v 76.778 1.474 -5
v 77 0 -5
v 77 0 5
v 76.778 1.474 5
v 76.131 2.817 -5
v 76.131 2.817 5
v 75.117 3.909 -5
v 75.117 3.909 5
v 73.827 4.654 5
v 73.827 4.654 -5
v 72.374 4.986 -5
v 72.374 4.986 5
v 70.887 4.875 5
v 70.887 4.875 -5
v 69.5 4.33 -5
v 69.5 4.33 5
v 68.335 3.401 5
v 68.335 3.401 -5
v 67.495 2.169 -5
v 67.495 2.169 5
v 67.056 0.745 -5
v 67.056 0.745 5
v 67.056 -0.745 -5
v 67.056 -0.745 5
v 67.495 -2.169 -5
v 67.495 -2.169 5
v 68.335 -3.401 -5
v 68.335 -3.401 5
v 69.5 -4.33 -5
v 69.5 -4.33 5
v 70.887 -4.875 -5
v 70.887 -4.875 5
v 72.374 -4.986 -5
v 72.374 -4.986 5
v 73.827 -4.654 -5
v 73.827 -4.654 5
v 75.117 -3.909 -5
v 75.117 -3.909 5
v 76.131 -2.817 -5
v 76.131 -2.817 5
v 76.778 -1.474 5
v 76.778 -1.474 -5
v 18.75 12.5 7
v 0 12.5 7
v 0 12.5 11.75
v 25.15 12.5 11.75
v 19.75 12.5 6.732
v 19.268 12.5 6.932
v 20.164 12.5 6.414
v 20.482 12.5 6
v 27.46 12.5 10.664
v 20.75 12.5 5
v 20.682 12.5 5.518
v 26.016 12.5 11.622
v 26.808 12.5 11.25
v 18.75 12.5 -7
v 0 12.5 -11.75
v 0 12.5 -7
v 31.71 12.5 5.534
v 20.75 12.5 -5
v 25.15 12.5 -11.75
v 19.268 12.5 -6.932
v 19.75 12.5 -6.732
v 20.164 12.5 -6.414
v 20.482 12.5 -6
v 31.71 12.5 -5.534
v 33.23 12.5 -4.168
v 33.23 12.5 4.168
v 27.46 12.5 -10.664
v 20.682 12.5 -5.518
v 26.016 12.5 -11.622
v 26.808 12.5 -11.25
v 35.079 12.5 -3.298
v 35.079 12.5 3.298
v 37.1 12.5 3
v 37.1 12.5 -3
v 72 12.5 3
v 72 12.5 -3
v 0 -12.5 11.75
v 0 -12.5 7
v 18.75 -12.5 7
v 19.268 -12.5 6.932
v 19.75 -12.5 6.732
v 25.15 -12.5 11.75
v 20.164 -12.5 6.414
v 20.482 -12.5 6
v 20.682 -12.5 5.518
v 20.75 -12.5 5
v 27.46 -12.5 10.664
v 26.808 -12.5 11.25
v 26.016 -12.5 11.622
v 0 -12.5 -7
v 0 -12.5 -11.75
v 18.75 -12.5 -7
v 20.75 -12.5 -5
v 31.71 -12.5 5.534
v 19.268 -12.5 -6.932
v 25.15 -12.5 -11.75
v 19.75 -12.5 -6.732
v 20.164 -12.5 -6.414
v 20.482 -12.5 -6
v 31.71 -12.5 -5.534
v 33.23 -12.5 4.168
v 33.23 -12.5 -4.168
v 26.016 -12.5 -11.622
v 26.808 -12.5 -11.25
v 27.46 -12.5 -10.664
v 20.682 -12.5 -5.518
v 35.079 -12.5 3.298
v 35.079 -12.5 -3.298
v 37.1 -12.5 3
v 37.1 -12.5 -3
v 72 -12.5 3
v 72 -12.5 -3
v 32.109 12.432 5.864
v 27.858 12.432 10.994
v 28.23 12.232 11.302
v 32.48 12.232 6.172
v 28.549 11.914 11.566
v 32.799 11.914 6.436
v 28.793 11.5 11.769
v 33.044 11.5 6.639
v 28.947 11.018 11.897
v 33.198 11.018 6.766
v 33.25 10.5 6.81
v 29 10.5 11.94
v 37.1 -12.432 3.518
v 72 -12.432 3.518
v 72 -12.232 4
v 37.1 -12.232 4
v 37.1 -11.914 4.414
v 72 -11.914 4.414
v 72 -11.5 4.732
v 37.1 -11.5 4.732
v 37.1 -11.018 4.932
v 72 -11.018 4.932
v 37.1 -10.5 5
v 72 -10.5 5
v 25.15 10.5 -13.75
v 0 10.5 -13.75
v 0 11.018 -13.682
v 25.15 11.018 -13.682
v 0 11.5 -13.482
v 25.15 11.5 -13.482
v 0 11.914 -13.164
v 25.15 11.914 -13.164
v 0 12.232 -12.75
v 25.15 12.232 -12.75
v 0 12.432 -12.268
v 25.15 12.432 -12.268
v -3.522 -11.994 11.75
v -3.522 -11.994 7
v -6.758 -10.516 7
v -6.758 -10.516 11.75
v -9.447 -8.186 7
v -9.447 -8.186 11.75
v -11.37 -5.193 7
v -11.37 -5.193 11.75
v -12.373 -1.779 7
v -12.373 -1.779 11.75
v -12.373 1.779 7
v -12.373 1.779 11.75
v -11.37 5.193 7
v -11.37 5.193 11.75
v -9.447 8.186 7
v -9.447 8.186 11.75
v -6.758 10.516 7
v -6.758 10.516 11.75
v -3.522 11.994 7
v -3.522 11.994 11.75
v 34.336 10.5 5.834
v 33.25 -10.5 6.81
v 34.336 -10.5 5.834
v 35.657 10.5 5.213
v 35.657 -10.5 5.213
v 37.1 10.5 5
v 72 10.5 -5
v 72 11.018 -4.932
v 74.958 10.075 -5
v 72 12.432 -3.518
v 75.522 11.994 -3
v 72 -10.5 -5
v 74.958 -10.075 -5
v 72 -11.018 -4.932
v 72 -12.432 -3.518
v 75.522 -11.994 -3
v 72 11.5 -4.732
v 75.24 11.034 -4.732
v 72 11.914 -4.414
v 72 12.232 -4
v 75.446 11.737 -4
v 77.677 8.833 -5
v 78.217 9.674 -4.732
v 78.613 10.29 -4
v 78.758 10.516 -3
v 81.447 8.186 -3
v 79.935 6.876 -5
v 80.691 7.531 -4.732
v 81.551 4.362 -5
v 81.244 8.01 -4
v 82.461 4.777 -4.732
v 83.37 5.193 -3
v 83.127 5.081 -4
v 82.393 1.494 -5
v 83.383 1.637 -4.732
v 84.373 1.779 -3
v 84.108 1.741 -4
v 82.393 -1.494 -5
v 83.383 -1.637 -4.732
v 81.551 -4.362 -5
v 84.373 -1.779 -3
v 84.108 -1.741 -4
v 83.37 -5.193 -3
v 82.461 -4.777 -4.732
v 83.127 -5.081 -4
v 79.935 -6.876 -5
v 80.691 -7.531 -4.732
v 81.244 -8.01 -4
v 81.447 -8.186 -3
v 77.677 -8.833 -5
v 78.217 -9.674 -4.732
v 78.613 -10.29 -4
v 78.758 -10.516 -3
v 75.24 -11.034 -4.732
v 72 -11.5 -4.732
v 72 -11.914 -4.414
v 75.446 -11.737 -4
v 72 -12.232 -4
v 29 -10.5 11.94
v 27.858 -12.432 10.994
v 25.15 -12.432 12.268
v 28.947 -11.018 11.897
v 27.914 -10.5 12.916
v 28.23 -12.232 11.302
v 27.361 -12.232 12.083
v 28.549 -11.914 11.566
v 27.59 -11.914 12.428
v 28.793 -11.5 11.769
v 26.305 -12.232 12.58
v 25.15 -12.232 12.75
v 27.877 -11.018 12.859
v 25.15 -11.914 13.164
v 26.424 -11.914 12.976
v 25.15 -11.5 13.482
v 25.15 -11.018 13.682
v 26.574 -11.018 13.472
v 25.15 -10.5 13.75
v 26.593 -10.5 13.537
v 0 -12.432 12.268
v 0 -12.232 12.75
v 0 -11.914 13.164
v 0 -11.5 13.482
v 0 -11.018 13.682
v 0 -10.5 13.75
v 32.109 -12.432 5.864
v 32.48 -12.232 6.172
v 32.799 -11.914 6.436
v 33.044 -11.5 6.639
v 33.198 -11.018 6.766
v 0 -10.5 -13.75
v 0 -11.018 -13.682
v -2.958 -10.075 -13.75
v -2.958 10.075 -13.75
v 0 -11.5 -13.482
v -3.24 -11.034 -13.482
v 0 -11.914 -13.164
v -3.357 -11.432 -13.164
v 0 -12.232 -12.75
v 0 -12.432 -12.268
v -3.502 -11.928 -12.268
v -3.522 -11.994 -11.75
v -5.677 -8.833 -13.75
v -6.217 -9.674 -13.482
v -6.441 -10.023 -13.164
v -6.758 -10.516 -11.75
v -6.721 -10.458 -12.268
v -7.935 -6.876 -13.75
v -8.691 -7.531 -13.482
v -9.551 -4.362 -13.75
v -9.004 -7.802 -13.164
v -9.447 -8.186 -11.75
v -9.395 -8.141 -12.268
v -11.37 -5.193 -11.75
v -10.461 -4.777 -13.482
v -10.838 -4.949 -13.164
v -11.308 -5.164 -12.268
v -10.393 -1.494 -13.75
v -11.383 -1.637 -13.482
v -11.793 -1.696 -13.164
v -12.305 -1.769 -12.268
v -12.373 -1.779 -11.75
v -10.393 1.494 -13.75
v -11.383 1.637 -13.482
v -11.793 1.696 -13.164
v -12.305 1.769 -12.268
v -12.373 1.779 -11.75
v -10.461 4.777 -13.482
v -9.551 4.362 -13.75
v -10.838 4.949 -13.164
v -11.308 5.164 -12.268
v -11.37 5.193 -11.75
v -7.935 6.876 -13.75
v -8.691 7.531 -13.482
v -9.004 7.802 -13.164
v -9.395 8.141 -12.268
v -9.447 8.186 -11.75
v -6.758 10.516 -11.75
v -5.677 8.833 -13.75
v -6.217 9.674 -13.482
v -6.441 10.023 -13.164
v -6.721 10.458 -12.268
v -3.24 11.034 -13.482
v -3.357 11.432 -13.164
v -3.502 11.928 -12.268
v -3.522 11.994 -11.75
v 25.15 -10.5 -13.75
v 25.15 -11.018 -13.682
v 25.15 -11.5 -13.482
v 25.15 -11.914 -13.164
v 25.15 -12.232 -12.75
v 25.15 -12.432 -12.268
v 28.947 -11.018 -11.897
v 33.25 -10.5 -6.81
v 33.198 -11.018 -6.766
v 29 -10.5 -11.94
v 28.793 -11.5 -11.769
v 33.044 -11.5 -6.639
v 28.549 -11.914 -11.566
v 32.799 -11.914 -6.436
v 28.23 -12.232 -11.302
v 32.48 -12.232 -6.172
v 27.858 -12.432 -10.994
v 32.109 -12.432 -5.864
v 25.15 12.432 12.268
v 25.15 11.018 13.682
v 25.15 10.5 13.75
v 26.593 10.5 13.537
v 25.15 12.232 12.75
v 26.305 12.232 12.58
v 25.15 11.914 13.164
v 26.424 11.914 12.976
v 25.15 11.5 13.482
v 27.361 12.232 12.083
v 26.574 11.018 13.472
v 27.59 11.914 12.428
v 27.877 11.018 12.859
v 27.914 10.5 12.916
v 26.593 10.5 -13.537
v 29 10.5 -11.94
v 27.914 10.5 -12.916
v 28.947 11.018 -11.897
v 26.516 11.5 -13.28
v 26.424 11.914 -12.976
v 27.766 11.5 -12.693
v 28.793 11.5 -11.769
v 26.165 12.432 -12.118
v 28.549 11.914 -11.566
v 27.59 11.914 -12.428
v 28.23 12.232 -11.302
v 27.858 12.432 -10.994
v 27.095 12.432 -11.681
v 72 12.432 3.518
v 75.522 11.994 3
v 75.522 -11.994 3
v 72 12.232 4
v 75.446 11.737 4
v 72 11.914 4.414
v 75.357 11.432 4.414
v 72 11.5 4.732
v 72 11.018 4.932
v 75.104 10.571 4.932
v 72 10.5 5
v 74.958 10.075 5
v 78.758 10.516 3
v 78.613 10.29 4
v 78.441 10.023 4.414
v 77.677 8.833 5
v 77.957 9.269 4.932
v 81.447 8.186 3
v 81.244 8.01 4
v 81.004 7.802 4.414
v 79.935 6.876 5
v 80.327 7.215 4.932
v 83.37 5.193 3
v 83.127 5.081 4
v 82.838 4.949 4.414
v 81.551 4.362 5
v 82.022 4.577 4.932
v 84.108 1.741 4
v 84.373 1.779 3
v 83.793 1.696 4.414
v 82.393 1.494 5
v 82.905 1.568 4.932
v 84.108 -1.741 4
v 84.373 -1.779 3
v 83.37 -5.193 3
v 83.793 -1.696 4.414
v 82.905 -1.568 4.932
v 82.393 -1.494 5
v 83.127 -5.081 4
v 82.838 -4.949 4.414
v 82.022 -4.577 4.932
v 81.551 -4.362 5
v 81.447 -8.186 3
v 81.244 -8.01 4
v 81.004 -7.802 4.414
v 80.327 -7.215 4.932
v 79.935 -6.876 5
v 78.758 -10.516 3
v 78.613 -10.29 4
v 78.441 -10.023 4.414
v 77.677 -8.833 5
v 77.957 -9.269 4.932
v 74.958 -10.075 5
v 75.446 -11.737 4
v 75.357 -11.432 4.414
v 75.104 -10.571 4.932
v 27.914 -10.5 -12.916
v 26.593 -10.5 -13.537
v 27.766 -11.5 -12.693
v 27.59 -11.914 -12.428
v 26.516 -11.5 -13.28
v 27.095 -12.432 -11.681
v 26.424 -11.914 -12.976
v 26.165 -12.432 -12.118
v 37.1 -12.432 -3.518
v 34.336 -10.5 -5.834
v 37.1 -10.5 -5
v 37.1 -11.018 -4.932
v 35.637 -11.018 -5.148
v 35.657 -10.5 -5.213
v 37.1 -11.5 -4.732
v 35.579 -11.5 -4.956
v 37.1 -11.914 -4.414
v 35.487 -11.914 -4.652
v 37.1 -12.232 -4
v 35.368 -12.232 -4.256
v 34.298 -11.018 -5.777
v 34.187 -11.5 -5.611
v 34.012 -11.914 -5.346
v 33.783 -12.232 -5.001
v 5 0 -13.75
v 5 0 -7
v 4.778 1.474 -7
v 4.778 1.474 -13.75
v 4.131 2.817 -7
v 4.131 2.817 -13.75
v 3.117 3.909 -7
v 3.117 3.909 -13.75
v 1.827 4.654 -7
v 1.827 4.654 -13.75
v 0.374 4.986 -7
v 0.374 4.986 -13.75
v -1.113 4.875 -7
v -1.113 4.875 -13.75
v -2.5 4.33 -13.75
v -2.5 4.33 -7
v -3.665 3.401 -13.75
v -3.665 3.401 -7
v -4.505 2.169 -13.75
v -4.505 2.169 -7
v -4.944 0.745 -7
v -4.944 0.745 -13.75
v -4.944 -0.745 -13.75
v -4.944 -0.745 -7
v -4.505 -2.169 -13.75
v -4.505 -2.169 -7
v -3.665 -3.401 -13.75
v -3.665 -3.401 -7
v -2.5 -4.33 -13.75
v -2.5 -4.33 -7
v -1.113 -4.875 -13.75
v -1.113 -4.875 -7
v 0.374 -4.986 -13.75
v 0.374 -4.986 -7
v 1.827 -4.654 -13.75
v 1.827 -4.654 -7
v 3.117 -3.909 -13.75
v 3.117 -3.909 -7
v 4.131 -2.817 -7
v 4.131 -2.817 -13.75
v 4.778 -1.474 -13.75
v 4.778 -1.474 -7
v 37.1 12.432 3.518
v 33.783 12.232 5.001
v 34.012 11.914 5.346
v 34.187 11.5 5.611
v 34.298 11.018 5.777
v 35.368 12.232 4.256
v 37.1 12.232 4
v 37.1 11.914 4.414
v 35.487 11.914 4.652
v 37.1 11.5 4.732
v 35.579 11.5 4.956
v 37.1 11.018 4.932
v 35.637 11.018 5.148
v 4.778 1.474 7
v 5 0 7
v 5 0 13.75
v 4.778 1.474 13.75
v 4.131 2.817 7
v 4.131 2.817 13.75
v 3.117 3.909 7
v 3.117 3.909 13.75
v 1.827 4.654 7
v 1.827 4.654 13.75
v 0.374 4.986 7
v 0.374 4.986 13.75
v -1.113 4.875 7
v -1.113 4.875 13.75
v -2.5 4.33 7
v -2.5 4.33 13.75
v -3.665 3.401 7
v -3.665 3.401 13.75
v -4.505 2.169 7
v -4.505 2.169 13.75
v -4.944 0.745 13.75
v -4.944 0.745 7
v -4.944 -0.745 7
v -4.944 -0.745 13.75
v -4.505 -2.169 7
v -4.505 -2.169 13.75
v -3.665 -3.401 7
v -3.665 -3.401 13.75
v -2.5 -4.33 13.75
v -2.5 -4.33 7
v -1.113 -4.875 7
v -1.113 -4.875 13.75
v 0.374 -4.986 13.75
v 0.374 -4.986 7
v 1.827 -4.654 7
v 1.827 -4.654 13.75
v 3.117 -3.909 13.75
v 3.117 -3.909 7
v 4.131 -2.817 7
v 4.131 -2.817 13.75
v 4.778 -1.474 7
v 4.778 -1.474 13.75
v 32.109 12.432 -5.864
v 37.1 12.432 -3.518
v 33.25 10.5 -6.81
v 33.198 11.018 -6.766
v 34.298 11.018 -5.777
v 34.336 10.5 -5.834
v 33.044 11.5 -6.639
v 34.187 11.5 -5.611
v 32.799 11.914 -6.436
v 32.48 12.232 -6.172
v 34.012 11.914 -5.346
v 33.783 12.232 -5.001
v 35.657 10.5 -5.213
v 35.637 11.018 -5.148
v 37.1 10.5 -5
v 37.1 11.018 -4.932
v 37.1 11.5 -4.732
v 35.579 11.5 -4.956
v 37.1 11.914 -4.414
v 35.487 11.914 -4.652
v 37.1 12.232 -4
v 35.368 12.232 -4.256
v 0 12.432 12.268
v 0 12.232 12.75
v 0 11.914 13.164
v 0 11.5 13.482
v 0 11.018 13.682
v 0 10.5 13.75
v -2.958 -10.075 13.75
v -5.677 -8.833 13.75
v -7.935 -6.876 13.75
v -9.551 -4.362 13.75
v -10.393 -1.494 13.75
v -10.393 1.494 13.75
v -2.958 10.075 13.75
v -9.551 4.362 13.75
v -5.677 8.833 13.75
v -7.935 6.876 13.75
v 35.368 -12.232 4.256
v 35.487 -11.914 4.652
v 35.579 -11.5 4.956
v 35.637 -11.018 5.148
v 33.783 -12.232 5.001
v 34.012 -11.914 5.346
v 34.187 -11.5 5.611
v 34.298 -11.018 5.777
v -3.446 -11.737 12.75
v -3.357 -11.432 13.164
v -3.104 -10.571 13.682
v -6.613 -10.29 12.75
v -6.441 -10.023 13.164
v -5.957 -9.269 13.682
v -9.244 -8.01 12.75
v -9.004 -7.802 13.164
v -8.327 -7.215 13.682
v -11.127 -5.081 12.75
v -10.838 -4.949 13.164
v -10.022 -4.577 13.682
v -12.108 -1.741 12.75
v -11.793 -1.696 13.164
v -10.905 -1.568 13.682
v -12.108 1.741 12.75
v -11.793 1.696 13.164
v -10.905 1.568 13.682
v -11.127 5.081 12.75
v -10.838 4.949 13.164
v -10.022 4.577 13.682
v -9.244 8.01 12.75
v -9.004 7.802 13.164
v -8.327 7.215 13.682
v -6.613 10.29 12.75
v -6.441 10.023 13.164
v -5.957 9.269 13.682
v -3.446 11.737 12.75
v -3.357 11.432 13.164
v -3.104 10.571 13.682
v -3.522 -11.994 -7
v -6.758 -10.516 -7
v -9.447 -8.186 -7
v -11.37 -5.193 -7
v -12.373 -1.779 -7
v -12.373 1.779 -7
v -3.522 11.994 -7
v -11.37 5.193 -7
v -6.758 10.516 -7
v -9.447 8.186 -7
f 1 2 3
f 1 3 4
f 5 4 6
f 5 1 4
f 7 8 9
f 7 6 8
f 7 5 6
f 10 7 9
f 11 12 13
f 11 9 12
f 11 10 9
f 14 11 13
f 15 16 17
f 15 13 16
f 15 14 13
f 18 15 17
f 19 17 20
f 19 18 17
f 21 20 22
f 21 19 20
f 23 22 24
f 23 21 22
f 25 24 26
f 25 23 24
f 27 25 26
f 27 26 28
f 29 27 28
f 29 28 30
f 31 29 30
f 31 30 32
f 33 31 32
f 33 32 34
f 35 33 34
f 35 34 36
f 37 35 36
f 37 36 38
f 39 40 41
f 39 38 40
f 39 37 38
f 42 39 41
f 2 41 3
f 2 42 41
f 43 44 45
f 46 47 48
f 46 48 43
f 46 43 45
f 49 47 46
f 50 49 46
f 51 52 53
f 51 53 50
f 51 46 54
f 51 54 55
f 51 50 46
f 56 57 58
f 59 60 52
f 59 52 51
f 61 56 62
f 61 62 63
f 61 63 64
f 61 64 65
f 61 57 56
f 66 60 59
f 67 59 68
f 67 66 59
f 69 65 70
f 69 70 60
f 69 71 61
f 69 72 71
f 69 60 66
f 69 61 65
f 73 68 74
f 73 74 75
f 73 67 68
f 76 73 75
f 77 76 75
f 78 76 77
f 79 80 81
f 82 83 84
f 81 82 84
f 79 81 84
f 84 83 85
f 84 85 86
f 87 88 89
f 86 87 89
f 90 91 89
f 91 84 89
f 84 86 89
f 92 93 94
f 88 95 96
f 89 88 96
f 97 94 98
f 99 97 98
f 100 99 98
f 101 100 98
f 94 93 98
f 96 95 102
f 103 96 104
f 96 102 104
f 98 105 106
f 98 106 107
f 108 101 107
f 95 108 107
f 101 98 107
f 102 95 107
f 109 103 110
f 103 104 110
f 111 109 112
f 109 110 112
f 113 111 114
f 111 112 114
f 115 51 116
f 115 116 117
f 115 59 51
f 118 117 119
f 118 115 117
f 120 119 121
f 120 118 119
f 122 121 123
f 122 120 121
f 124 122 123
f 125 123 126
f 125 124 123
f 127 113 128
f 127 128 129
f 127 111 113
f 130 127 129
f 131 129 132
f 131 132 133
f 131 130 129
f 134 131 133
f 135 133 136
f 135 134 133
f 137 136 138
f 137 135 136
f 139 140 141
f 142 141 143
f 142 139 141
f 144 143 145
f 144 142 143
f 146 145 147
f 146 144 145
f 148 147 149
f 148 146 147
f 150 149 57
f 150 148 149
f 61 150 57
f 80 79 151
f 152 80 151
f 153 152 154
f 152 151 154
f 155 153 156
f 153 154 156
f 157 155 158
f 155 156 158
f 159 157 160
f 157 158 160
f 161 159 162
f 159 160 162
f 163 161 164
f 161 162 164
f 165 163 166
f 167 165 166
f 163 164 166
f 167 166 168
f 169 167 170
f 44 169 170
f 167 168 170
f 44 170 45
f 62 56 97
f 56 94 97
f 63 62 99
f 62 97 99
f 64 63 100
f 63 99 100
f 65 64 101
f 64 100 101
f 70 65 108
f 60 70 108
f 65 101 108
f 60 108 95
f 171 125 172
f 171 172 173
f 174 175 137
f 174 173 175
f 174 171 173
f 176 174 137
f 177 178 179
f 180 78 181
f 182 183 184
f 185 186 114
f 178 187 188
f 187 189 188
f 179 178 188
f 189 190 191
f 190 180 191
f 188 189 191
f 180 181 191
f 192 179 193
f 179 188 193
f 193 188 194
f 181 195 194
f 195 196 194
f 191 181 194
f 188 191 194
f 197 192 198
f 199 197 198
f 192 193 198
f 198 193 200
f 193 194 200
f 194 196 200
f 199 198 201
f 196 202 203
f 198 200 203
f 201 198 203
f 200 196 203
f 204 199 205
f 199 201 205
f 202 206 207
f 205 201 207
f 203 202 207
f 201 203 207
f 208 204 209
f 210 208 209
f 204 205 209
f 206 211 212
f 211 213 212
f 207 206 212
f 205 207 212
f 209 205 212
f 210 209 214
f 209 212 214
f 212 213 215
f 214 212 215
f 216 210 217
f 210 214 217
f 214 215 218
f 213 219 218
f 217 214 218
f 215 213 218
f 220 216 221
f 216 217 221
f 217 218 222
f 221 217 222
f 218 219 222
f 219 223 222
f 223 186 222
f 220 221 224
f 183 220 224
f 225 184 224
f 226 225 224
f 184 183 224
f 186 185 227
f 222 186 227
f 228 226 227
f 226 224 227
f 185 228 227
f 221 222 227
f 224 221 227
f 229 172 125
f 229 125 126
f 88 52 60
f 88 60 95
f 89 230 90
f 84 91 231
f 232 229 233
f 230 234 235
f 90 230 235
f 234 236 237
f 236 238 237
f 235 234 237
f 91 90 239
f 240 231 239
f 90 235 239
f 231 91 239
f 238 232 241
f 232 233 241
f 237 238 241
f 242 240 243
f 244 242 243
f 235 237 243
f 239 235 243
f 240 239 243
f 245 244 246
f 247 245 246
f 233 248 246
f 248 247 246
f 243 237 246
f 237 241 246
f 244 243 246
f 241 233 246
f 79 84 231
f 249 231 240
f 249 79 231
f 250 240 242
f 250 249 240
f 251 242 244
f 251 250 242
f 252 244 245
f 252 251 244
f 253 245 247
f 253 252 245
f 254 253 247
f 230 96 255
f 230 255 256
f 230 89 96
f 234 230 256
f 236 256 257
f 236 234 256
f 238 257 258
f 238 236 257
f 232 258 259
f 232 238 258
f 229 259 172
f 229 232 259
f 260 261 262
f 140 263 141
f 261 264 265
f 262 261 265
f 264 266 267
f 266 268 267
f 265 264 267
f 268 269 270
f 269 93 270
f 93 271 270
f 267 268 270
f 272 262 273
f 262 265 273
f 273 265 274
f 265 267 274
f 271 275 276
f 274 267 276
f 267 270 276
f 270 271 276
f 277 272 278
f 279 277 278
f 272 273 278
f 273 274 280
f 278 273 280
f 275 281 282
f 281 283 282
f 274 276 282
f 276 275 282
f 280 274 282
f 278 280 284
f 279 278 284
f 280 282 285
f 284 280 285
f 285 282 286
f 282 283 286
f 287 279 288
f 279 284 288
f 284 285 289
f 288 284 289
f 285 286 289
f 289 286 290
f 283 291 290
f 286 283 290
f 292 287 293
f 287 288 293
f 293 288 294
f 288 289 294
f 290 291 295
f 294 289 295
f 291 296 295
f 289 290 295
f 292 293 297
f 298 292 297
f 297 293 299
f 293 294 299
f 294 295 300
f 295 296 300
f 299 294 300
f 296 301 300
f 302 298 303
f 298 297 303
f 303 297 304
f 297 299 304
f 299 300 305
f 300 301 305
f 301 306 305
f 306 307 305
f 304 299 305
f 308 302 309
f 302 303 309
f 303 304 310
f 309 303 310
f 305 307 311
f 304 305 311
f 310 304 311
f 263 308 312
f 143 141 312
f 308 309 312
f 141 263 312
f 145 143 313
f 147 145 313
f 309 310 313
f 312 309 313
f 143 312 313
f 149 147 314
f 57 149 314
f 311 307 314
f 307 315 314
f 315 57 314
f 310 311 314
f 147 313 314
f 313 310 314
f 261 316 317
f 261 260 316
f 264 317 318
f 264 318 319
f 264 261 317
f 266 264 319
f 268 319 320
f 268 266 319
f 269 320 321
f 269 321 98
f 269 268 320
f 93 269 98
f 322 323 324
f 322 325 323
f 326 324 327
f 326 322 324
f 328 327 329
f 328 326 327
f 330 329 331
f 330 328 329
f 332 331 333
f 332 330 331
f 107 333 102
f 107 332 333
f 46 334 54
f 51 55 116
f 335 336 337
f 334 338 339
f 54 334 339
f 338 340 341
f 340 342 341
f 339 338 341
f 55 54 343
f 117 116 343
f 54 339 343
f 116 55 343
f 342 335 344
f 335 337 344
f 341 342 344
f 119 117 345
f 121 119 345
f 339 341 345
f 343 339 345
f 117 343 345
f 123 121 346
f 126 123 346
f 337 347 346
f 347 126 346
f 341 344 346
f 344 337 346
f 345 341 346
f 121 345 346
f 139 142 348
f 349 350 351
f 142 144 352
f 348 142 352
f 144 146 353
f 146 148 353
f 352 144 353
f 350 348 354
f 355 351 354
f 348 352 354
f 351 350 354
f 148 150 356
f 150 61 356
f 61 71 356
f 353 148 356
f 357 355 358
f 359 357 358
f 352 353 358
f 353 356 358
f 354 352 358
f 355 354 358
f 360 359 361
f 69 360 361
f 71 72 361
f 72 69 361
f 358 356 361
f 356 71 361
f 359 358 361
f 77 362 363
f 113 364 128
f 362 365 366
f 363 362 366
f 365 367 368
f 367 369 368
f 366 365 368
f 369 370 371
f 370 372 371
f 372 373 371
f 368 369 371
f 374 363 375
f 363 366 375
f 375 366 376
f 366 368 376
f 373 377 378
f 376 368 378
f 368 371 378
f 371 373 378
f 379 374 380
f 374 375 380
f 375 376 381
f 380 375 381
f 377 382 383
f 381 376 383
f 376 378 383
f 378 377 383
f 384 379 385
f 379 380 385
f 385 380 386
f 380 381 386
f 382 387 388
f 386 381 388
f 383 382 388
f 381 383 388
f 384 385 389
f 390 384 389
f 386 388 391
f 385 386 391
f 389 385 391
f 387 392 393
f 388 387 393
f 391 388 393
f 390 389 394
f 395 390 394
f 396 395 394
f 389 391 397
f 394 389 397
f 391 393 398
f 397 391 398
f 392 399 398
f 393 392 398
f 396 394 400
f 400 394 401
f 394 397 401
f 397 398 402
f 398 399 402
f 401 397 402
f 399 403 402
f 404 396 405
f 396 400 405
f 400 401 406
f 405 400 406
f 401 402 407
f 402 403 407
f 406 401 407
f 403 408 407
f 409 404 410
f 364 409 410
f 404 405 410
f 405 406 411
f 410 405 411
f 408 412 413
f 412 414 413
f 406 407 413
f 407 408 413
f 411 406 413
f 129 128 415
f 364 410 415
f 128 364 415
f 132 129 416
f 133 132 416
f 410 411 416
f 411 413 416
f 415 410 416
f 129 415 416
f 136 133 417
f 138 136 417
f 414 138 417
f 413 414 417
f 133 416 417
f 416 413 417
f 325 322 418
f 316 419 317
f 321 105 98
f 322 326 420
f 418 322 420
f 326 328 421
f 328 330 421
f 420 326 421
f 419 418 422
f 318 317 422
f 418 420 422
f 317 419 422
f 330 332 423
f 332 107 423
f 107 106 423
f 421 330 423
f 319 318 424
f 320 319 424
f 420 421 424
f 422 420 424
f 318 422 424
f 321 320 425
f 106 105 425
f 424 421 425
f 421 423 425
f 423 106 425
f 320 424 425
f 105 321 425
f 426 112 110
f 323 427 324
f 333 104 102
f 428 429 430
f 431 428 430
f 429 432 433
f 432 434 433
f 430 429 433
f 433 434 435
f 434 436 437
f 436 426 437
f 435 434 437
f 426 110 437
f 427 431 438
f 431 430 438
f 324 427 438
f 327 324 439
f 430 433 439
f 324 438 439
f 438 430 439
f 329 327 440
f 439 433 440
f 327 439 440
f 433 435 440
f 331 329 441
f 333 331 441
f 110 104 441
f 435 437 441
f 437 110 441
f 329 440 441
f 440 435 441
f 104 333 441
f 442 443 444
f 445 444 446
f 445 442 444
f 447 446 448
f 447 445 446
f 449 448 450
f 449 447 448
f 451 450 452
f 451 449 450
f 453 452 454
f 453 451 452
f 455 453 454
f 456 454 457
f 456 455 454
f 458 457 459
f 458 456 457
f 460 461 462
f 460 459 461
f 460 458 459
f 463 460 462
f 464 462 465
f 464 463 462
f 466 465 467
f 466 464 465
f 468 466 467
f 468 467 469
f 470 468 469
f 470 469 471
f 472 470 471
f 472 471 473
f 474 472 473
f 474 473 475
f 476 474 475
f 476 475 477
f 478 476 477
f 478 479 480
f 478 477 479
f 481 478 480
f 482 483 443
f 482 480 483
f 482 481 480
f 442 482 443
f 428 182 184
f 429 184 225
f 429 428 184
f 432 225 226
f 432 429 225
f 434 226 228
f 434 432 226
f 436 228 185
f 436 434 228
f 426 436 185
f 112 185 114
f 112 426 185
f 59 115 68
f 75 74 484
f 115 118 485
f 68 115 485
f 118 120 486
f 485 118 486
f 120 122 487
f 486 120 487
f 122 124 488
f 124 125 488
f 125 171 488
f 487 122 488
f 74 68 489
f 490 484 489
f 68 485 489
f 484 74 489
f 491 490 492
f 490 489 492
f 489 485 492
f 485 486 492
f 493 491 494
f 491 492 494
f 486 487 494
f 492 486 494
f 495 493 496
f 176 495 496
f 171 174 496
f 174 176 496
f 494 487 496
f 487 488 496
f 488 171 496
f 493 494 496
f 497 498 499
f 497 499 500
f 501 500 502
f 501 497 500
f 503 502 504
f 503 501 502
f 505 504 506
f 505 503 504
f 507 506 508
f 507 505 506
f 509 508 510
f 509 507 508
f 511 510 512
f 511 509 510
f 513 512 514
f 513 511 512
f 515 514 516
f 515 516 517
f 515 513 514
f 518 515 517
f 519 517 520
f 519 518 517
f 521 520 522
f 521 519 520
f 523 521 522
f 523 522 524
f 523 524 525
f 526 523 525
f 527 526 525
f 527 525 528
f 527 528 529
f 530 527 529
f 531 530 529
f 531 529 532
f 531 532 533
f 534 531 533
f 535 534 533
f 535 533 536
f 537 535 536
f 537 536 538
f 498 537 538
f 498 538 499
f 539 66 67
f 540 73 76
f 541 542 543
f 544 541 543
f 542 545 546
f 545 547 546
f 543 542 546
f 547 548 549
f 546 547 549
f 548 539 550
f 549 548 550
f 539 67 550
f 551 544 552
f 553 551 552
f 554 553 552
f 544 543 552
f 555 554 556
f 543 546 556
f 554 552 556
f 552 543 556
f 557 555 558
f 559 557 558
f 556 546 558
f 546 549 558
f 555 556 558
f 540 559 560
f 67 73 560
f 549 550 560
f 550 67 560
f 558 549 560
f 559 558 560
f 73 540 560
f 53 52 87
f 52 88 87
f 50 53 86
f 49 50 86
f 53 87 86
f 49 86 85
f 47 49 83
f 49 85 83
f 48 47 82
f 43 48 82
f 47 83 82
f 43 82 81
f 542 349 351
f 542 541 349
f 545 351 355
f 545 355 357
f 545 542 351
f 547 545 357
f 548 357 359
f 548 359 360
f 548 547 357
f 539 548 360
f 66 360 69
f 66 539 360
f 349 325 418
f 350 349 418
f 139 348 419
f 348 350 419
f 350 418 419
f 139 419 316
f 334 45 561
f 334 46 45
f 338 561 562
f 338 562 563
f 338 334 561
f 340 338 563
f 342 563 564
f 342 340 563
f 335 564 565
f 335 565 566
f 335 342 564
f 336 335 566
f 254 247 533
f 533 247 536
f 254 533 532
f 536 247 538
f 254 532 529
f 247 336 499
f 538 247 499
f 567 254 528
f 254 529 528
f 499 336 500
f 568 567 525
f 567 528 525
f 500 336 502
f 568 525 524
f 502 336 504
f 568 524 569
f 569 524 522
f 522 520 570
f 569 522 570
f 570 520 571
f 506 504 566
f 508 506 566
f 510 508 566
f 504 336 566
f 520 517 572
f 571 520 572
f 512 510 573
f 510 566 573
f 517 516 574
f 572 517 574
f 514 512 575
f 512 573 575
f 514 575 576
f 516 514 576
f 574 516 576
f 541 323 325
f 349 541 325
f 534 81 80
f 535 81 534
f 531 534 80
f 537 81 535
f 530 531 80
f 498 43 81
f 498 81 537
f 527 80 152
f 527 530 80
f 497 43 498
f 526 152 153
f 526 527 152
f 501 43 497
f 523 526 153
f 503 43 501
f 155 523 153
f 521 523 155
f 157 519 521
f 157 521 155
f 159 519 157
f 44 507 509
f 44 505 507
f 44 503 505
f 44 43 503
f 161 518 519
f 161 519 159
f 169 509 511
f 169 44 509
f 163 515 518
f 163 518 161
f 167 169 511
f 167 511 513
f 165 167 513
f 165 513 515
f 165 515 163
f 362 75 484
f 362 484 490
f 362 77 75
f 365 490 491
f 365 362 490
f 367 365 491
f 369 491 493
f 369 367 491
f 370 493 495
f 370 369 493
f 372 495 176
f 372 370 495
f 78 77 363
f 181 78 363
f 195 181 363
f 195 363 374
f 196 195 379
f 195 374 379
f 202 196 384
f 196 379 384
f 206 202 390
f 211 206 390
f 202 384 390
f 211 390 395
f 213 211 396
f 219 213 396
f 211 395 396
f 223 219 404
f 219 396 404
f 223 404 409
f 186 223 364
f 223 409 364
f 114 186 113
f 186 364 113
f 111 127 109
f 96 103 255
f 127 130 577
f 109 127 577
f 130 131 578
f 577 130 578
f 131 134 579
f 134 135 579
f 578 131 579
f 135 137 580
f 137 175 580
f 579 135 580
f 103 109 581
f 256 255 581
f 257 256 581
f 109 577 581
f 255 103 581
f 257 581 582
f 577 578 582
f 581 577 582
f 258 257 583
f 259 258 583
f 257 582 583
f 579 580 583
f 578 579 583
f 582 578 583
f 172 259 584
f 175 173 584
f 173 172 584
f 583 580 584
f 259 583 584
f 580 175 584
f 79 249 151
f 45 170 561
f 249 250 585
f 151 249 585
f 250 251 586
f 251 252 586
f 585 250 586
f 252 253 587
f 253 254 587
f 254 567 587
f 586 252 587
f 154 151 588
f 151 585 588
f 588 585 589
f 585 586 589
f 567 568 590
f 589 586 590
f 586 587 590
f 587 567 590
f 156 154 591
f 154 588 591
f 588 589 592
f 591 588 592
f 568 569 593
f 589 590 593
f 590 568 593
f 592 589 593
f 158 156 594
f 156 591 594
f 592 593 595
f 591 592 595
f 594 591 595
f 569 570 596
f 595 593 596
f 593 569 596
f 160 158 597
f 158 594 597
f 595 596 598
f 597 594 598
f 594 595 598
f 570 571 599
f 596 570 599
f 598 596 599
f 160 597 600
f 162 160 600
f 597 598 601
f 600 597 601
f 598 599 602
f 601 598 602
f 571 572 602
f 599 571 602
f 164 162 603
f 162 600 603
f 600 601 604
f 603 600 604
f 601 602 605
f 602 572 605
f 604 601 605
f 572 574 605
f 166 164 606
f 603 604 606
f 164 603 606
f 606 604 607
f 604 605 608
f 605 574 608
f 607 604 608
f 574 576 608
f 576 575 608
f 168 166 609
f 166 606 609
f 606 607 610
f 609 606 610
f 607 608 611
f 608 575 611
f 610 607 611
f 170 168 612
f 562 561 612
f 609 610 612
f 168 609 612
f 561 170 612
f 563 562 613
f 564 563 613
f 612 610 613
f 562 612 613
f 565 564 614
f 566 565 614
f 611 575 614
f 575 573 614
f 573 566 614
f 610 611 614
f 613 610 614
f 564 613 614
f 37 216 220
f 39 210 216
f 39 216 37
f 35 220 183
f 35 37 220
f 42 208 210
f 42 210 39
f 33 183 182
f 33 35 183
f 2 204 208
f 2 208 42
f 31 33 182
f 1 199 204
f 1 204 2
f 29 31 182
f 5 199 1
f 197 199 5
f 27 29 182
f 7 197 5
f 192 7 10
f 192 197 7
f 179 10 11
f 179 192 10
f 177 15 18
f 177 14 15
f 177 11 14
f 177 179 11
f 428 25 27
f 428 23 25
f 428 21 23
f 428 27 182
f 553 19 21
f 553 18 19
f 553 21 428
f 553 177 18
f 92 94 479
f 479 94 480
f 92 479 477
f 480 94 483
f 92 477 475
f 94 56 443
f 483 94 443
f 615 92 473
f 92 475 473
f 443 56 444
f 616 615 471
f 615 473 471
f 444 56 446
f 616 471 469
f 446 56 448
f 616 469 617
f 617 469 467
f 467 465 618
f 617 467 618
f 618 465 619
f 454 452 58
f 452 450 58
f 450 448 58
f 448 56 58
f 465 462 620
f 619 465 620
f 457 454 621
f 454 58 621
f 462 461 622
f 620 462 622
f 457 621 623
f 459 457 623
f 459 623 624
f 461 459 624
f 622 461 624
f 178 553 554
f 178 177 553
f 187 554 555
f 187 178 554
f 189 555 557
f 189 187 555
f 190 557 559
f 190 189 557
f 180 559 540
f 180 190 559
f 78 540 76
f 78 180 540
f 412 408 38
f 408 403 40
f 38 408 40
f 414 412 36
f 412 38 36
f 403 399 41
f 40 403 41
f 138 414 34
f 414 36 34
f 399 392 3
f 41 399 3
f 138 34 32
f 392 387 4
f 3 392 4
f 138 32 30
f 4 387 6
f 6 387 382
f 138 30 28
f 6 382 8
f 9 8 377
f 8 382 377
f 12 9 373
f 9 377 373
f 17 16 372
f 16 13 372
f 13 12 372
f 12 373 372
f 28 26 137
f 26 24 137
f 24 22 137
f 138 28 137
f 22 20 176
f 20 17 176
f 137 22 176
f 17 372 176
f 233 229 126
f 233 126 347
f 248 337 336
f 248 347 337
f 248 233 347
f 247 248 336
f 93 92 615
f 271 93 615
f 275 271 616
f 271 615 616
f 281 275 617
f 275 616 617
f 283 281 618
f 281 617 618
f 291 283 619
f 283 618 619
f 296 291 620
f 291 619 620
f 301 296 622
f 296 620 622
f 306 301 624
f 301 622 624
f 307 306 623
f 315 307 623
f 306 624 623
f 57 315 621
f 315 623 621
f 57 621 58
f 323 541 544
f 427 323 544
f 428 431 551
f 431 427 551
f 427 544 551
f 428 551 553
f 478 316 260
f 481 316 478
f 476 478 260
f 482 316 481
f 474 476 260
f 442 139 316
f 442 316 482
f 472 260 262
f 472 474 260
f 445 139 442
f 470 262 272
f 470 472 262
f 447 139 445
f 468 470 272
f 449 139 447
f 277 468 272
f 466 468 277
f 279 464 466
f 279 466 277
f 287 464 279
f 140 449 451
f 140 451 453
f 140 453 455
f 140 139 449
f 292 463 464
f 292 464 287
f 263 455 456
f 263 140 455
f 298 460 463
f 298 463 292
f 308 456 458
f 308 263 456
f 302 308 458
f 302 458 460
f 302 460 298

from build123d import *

# Parameters (mm, degrees)
BASE_EXTRUDE_DEPTH  = 13.75
CUT_EXTRUDE1_DEPTH  = 7
BOSS_EXTRUDE1_DEPTH = 5
BOSS_EXTRUDE2_START = -25
BOSS_EXTRUDE2_DEPTH = 25
HOLE1_START         = -13.75
HOLE1_OUTLINE_R     = 5
HOLE1_DEPTH         = 27.5
LPATTERN1_COUNT     = 2
LPATTERN1_PITCH     = 72
FILLET1_R           = 5
FILLET2_R           = 5
FILLET3_R           = 2
FILLET4_R           = 2


# Read off the part's stored shape, not the designer's step: Hole1
with BuildPart() as part:
    # Sketch3 → Base-Extrude (new, symmetric)
    with BuildSketch(Plane.XY):
        with BuildLine():
            Line((0, 12.5), (27.5, 12.5))
            Line((27.5, 12.5), (27.5, -12.5))
            Line((27.5, -12.5), (0, -12.5))
            ThreePointArc((0, -12.5), (-12.5, 0), (0, 12.5))
        make_face()
    extrude(amount=BASE_EXTRUDE_DEPTH, both=True)

    # Sketch5 → Cut-Extrude1 (cut, symmetric)
    with BuildSketch(Plane.XY):
        with BuildLine():
            Line((20.75, 12.5), (20.75, -12.5))
            Line((20.75, -12.5), (0, -12.5))
            ThreePointArc((0, -12.5), (-12.5, 0), (0, 12.5))
            Line((0, 12.5), (20.75, 12.5))
        make_face()
    extrude(amount=CUT_EXTRUDE1_DEPTH, both=True, mode=Mode.SUBTRACT)

    # Sketch6 → Boss-Extrude1 (add, symmetric)
    with BuildSketch(Plane.XY):
        with BuildLine():
            Line((27.5, 12.5), (72, 12.5))
            ThreePointArc((72, 12.5), (84.5, 0), (72, -12.5))
            Line((72, -12.5), (27.5, -12.5))
            Line((27.5, -12.5), (27.5, 12.5))
        make_face()
    extrude(amount=BOSS_EXTRUDE1_DEPTH, both=True)

    # Sketch8 → Boss-Extrude2 (add)
    with BuildSketch(Plane(origin=(0, 12.5, 0), x_dir=(-1, 0, 0), z_dir=(0, 1, 0)).offset(BOSS_EXTRUDE2_START)):
        Polygon((-27.5, 13.75), (-27.5, 5), (-34.75, 5), align=None)
    boss_extrude2 = extrude(amount=BOSS_EXTRUDE2_DEPTH)

    # Mirror1: Boss-Extrude2 across plane
    add(boss_extrude2.mirror(Plane.XY))

    # Hole1 outline → Hole1 (cut)
    with BuildSketch(Plane.XY.offset(HOLE1_START)):
        Circle(HOLE1_OUTLINE_R)
    hole1 = extrude(amount=HOLE1_DEPTH, mode=Mode.SUBTRACT)

    # LPattern1: Hole1 ×2
    with Locations(*[(i * LPATTERN1_PITCH, 0, 0) for i in range(1, LPATTERN1_COUNT)]):
        add(hole1, mode=Mode.SUBTRACT)

    # Fillet1
    fillet1_edges = [part.edges().sort_by_distance(p)[0] for p in [
        (34.75, 0, 5),
        (34.75, 0, -5),
    ]]
    fillet(fillet1_edges, radius=FILLET1_R)

    # Fillet2
    fillet2_edges = [part.edges().sort_by_distance(p)[0] for p in [
        (27.5, 0, 13.75),
        (27.5, 0, -13.75),
    ]]
    fillet(fillet2_edges, radius=FILLET2_R)

    # Fillet3
    fillet3_edges = [part.edges().sort_by_distance(p)[0] for p in [
        (54.550233765, -12.5, 5),
        (84.5, 0, 5),
        (84.5, 0, -5),
        (54.550233765, -12.5, -5),
        (-12.5, 0, 13.75),
        (12.574766235, 12.5, -13.75),
        (-12.5, 0, -13.75),
        (12.574766235, 12.5, 13.75),
        (54.550233765, 12.5, 5),
        (54.550233765, 12.5, -5),
        (34.973315281, 12.5, 5.475044386),
        (34.973315281, -12.5, 5.475044386),
        (34.973315281, 12.5, -5.475044386),
        (34.973315281, -12.5, -5.475044386),
        (31.125, 12.5, -9.375),
        (31.125, -12.5, -9.375),
        (31.125, 12.5, 9.375),
        (27.276684719, 12.5, 13.274955614),
        (27.276684719, 12.5, -13.274955614),
        (12.574766235, -12.5, -13.75),
        (31.125, -12.5, 9.375),
        (12.574766235, -12.5, 13.75),
        (27.276684719, -12.5, 13.274955614),
        (27.276684719, -12.5, -13.274955614),
    ]]
    fillet(fillet3_edges, radius=FILLET3_R)

    # Fillet4
    fillet4_edges = [part.edges().sort_by_distance(p)[0] for p in [
        (20.75, 0, 7),
        (20.75, 0, -7),
    ]]
    fillet(fillet4_edges, radius=FILLET4_R)


solid = part.part
